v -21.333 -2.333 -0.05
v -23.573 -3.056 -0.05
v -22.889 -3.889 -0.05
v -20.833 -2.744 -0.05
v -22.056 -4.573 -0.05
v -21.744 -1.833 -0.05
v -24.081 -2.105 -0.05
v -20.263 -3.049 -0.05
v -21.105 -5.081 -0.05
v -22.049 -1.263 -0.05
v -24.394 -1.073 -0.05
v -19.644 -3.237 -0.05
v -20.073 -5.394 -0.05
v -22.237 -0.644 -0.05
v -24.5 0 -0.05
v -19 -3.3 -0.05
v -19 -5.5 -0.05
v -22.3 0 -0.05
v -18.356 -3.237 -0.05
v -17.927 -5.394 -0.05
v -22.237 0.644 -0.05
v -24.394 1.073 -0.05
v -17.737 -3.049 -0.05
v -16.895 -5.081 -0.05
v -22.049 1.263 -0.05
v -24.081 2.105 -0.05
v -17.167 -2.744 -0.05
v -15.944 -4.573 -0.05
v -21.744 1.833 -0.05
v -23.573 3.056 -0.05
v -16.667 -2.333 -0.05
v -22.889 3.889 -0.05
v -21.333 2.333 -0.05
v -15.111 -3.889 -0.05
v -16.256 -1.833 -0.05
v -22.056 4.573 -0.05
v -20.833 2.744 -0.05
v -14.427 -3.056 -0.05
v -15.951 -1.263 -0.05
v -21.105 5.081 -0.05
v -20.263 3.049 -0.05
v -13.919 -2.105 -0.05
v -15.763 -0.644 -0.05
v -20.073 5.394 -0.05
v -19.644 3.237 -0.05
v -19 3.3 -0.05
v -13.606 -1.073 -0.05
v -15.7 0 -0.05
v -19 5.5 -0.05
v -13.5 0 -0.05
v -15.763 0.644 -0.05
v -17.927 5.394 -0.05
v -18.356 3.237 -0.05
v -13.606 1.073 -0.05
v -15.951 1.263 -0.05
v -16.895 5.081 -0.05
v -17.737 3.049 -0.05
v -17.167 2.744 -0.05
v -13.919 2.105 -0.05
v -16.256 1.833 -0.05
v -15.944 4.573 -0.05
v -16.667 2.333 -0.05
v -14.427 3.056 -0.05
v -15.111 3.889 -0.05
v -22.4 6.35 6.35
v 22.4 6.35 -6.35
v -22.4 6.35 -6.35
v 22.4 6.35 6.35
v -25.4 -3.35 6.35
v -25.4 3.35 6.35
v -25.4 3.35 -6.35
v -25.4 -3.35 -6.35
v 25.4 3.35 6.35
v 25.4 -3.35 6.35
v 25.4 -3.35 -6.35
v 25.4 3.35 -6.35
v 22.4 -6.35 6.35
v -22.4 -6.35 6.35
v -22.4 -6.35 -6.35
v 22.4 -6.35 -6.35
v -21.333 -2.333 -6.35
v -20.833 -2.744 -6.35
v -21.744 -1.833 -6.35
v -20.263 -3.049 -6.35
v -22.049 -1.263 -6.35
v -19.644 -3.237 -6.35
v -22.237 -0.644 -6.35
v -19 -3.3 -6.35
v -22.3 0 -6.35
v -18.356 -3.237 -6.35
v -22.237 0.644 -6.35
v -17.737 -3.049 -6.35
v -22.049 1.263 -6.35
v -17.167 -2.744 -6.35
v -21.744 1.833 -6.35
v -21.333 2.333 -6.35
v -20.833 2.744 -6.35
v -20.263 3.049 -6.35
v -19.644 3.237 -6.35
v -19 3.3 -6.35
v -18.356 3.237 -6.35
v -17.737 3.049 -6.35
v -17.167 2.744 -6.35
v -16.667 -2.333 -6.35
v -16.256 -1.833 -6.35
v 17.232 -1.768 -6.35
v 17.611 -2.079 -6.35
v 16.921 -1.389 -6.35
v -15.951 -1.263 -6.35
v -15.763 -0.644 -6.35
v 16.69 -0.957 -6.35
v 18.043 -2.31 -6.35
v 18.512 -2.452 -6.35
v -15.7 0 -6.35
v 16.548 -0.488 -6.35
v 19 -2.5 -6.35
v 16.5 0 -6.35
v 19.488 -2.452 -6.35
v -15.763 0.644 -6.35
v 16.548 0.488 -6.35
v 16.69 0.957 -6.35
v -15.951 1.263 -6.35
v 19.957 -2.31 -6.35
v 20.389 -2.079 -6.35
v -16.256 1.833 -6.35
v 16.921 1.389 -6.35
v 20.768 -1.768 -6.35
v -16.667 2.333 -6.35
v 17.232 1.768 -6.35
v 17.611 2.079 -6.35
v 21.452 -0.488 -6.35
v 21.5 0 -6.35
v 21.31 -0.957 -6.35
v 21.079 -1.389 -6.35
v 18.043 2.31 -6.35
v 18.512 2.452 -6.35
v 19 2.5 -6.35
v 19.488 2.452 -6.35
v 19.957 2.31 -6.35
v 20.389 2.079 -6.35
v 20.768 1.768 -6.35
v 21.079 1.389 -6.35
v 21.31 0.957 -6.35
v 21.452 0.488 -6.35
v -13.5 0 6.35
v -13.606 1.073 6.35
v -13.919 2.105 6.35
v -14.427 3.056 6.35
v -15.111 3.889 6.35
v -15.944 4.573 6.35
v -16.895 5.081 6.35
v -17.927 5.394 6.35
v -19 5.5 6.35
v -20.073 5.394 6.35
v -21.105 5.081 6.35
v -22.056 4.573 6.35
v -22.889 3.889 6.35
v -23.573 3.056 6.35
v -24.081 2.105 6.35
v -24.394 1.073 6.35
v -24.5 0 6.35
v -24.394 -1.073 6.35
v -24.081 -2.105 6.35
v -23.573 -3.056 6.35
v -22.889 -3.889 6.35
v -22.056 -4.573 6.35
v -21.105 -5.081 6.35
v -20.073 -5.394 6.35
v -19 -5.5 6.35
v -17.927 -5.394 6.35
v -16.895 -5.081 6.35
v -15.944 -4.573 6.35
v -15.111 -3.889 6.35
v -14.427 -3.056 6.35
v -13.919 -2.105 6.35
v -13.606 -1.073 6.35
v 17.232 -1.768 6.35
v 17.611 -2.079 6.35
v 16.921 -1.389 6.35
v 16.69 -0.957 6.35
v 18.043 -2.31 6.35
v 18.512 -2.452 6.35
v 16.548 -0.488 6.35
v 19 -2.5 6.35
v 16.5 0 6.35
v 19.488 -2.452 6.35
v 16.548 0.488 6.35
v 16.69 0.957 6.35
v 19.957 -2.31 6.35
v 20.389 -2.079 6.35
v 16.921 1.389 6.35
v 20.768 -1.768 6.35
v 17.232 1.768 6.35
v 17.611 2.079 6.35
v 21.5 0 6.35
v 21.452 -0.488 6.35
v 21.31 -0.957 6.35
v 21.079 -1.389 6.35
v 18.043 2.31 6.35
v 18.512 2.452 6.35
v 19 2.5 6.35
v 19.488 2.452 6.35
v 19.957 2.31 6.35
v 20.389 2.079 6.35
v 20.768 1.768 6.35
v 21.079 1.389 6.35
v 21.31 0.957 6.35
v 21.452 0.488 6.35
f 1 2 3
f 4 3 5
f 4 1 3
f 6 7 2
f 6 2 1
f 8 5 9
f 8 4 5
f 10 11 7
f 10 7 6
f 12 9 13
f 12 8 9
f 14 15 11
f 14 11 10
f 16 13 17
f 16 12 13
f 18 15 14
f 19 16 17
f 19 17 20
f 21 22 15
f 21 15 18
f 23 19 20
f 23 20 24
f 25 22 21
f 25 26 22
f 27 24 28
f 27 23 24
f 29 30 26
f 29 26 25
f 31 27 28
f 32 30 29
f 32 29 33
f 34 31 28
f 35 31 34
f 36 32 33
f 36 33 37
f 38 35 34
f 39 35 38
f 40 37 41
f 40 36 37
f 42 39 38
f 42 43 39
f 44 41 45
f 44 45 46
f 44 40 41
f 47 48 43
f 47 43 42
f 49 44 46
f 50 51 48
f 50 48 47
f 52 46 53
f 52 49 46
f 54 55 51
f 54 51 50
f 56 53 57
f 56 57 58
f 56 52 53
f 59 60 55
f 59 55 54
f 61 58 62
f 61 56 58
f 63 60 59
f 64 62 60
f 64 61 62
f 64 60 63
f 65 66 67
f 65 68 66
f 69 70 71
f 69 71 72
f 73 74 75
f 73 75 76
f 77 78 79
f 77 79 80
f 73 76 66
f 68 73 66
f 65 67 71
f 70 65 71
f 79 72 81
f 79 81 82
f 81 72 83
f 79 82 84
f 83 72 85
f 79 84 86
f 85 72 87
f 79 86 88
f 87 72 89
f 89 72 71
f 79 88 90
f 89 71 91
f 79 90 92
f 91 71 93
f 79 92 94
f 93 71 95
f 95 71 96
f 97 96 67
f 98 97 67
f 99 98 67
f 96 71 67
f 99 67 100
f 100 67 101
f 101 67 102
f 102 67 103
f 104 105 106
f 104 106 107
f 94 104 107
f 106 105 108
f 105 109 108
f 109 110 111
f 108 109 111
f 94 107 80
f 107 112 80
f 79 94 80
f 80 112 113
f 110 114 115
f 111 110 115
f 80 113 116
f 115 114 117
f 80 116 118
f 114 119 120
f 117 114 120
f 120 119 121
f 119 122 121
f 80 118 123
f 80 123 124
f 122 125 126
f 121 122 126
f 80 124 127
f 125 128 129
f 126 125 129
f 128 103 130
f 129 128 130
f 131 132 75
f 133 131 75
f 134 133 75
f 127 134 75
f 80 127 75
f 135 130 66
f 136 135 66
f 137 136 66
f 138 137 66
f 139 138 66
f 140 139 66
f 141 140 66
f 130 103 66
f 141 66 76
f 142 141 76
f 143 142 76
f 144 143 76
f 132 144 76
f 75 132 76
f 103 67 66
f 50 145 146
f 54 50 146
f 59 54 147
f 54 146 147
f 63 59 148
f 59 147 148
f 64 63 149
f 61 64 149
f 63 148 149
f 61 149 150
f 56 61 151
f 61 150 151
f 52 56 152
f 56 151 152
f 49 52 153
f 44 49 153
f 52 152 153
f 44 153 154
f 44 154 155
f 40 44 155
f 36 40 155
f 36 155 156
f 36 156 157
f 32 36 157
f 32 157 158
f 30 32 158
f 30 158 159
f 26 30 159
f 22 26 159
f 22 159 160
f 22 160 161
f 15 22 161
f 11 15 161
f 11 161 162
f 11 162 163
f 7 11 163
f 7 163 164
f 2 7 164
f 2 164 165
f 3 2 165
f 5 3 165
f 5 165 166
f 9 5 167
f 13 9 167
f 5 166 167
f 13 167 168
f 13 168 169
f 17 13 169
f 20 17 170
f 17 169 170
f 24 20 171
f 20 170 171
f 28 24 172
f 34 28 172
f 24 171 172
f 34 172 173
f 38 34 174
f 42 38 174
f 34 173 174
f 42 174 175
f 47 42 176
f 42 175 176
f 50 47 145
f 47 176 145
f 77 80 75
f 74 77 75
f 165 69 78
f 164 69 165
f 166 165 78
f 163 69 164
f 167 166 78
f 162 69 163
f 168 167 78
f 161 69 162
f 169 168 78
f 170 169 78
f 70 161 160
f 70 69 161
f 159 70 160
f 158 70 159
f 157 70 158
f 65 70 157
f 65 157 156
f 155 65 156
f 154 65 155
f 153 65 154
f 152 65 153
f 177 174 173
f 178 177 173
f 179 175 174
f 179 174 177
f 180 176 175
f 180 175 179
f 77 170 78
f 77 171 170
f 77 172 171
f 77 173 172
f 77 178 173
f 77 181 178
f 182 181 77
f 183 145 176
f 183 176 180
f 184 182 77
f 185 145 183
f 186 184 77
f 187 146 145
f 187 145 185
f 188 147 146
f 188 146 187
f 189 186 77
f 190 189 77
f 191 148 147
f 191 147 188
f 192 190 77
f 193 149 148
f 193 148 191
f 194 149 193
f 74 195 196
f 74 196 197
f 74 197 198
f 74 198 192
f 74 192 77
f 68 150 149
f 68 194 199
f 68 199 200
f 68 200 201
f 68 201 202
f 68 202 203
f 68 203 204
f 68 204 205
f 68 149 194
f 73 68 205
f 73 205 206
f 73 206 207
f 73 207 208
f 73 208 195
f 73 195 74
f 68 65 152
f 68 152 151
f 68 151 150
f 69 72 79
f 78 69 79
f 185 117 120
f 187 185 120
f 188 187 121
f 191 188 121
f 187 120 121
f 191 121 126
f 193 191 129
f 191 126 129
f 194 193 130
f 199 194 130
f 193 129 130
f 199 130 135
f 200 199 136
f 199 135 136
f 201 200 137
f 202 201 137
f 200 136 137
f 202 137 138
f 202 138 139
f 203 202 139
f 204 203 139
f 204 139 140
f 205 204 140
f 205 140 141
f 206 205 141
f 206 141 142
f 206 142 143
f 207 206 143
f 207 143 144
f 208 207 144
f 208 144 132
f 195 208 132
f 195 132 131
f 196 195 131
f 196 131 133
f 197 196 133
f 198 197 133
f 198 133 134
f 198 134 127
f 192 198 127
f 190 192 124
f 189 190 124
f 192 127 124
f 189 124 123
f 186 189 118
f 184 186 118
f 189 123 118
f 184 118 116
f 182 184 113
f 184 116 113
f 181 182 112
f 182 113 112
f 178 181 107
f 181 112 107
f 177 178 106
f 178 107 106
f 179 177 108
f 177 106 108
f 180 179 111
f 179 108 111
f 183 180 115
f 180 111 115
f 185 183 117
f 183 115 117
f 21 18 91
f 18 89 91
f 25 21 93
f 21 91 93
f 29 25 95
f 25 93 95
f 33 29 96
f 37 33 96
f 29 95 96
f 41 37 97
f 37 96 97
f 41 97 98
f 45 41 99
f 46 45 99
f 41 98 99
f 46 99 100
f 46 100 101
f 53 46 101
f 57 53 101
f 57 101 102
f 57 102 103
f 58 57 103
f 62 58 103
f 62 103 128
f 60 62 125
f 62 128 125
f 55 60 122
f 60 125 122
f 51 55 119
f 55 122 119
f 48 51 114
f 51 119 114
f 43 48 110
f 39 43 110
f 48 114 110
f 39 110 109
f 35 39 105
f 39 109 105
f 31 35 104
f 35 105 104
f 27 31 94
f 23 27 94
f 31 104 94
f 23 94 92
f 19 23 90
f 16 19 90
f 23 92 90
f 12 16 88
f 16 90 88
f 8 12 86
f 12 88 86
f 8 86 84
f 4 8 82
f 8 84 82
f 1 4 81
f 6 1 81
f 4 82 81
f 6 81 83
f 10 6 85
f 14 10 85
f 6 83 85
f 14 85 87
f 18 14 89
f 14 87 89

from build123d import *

# Parameters (mm, degrees)
SALIENTE_EXTRUIR1_DEPTH                              = 6.35
TALADRO_ROSCADO_M61_D                                = 5
REFRENTADO_PARA_TORNILLO_CON_CABEZA_HUEC_D           = 6.6
REFRENTADO_PARA_TORNILLO_CON_CABEZA_HUEC_CBORE_D     = 11
REFRENTADO_PARA_TORNILLO_CON_CABEZA_HUEC_CBORE_DEPTH = 6.4


with BuildPart() as part:
    # Croquis1 → Saliente-Extruir1 (new, symmetric)
    with BuildSketch(Plane.XY):
        Polygon((-22.4, 6.35), (-25.4, 3.35), (-25.4, -3.35), (-22.4, -6.35), (22.4, -6.35), (25.4, -3.35), (25.4, 3.35), (22.4, 6.35), align=None)
    extrude(amount=SALIENTE_EXTRUIR1_DEPTH, both=True)

    # Taladro roscado M61 (through all)
    with Locations(Plane.XY.offset(6.35)):
        with Locations((19, 0)):
            Hole(TALADRO_ROSCADO_M61_D / 2)

    # Refrentado para tornillo con cabeza huec (through all)
    with Locations(Plane.XY.offset(6.35)):
        with Locations((-19, 0)):
            CounterBoreHole(REFRENTADO_PARA_TORNILLO_CON_CABEZA_HUEC_D / 2, REFRENTADO_PARA_TORNILLO_CON_CABEZA_HUEC_CBORE_D / 2, REFRENTADO_PARA_TORNILLO_CON_CABEZA_HUEC_CBORE_DEPTH)


solid = part.part
